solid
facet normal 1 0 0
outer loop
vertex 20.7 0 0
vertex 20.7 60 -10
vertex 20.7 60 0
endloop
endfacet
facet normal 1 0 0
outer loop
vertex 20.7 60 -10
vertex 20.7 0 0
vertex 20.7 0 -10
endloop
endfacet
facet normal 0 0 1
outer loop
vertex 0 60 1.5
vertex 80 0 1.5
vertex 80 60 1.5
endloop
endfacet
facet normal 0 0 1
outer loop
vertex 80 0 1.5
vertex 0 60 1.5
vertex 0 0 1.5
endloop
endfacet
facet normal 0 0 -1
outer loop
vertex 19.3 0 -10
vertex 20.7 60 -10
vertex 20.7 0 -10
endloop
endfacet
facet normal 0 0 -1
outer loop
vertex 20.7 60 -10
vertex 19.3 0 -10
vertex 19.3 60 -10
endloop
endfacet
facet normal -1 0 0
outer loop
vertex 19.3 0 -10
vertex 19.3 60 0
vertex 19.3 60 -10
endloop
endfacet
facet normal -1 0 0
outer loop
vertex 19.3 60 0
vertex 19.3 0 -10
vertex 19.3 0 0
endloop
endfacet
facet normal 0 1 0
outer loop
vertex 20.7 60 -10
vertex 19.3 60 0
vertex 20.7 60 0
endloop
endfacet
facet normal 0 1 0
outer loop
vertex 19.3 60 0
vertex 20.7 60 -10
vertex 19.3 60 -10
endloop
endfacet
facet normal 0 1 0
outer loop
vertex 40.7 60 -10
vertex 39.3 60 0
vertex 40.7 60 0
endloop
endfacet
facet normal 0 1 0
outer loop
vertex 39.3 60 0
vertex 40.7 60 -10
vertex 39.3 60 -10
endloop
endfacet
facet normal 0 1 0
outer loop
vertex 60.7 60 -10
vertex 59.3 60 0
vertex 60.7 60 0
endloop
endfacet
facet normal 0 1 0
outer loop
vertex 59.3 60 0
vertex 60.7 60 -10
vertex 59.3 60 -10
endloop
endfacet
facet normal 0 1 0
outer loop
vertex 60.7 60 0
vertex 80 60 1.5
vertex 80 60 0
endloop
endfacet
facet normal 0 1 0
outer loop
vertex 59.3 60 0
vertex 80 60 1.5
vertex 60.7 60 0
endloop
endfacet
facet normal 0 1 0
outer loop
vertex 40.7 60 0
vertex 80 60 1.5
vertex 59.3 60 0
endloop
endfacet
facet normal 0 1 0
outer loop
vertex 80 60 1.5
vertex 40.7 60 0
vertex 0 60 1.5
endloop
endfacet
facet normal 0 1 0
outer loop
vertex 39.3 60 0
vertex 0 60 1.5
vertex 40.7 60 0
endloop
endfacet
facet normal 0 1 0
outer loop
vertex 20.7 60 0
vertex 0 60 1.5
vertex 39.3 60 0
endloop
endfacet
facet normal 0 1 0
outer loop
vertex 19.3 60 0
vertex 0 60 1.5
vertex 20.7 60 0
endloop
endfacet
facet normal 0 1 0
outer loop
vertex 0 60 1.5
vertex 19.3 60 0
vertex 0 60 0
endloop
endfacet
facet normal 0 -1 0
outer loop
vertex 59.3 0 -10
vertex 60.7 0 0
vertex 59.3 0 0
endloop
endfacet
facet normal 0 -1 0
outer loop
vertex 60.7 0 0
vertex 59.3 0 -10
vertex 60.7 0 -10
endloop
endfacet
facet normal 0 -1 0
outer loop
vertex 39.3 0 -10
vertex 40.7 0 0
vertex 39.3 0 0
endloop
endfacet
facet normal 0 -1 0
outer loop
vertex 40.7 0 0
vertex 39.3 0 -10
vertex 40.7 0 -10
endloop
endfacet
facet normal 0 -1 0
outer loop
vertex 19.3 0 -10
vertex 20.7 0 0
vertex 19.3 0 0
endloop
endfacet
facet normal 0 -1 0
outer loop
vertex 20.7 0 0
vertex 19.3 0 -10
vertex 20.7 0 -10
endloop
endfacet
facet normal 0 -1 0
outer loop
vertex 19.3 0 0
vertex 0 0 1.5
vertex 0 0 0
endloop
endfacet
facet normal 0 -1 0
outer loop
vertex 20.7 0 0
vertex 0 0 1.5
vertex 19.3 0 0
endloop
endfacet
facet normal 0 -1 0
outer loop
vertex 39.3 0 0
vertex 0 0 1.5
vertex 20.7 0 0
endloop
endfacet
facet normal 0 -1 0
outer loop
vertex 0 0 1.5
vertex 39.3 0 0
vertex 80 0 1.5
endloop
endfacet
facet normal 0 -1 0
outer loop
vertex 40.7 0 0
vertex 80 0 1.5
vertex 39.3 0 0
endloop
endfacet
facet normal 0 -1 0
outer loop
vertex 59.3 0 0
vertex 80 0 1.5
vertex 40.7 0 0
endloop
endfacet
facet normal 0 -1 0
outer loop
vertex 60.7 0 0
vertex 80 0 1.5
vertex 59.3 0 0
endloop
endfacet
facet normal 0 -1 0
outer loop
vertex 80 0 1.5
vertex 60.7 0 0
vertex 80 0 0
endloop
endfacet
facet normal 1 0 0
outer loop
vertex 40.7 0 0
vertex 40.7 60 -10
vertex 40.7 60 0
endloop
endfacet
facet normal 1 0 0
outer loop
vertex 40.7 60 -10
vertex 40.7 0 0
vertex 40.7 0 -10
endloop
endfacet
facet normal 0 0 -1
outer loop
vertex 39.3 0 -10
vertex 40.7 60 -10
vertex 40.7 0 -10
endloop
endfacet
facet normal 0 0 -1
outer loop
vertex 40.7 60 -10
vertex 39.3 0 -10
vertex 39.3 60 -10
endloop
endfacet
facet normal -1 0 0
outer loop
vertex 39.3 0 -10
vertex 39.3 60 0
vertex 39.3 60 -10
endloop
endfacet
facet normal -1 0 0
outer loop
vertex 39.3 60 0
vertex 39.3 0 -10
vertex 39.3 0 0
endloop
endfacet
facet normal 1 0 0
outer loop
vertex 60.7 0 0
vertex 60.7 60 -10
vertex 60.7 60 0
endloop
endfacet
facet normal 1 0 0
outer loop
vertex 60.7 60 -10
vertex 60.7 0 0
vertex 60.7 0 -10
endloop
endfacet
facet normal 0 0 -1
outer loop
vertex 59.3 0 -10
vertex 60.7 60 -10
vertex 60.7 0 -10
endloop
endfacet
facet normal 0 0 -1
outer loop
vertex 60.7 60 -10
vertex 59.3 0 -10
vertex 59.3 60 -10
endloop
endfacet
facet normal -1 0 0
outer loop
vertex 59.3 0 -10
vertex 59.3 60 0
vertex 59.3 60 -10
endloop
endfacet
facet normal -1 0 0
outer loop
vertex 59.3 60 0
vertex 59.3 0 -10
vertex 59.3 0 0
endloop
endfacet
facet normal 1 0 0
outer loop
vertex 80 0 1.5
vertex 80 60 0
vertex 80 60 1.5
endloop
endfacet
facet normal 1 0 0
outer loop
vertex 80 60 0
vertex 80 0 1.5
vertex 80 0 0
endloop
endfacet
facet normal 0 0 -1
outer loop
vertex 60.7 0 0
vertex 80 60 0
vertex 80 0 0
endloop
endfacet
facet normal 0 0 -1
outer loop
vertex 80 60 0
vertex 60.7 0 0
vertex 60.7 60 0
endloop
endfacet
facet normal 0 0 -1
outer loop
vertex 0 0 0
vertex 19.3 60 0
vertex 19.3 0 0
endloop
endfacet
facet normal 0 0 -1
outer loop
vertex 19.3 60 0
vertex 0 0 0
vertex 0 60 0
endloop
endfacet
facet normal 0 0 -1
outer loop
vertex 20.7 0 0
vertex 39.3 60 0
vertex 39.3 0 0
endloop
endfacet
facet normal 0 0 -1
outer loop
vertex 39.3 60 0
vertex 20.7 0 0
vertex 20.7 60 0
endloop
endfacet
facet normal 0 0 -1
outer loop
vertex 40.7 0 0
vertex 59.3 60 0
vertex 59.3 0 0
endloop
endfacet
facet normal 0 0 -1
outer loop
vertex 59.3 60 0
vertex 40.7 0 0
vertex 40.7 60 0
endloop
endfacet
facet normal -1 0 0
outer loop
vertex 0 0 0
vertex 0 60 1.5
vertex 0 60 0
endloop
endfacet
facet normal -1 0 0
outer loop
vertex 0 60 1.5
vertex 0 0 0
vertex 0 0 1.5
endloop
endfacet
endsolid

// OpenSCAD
$fn = 32;

// ----------------------------------------------------------------------
// Ribbed panel: 1.5 mm panel
// ----------------------------------------------------------------------

// --- parameters (mm) ---
panel_l = 80;             // panel length, X
panel_w = 60;             // panel width, Y
panel_t = 1.5;            // panel thickness, Z
rib_t = 1.4;              // rib thickness
rib_h = 10;               // rib height below the panel
ribs = 3;                 // number of ribs

total_h = panel_t + rib_h;  // overall height

union() {
  cube([panel_l, panel_w, panel_t]);
  for (i = [1 : ribs])
    translate([i * panel_l / (ribs + 1) - rib_t / 2, 0, -rib_h])
      cube([rib_t, panel_w, rib_h + panel_t]);
}
